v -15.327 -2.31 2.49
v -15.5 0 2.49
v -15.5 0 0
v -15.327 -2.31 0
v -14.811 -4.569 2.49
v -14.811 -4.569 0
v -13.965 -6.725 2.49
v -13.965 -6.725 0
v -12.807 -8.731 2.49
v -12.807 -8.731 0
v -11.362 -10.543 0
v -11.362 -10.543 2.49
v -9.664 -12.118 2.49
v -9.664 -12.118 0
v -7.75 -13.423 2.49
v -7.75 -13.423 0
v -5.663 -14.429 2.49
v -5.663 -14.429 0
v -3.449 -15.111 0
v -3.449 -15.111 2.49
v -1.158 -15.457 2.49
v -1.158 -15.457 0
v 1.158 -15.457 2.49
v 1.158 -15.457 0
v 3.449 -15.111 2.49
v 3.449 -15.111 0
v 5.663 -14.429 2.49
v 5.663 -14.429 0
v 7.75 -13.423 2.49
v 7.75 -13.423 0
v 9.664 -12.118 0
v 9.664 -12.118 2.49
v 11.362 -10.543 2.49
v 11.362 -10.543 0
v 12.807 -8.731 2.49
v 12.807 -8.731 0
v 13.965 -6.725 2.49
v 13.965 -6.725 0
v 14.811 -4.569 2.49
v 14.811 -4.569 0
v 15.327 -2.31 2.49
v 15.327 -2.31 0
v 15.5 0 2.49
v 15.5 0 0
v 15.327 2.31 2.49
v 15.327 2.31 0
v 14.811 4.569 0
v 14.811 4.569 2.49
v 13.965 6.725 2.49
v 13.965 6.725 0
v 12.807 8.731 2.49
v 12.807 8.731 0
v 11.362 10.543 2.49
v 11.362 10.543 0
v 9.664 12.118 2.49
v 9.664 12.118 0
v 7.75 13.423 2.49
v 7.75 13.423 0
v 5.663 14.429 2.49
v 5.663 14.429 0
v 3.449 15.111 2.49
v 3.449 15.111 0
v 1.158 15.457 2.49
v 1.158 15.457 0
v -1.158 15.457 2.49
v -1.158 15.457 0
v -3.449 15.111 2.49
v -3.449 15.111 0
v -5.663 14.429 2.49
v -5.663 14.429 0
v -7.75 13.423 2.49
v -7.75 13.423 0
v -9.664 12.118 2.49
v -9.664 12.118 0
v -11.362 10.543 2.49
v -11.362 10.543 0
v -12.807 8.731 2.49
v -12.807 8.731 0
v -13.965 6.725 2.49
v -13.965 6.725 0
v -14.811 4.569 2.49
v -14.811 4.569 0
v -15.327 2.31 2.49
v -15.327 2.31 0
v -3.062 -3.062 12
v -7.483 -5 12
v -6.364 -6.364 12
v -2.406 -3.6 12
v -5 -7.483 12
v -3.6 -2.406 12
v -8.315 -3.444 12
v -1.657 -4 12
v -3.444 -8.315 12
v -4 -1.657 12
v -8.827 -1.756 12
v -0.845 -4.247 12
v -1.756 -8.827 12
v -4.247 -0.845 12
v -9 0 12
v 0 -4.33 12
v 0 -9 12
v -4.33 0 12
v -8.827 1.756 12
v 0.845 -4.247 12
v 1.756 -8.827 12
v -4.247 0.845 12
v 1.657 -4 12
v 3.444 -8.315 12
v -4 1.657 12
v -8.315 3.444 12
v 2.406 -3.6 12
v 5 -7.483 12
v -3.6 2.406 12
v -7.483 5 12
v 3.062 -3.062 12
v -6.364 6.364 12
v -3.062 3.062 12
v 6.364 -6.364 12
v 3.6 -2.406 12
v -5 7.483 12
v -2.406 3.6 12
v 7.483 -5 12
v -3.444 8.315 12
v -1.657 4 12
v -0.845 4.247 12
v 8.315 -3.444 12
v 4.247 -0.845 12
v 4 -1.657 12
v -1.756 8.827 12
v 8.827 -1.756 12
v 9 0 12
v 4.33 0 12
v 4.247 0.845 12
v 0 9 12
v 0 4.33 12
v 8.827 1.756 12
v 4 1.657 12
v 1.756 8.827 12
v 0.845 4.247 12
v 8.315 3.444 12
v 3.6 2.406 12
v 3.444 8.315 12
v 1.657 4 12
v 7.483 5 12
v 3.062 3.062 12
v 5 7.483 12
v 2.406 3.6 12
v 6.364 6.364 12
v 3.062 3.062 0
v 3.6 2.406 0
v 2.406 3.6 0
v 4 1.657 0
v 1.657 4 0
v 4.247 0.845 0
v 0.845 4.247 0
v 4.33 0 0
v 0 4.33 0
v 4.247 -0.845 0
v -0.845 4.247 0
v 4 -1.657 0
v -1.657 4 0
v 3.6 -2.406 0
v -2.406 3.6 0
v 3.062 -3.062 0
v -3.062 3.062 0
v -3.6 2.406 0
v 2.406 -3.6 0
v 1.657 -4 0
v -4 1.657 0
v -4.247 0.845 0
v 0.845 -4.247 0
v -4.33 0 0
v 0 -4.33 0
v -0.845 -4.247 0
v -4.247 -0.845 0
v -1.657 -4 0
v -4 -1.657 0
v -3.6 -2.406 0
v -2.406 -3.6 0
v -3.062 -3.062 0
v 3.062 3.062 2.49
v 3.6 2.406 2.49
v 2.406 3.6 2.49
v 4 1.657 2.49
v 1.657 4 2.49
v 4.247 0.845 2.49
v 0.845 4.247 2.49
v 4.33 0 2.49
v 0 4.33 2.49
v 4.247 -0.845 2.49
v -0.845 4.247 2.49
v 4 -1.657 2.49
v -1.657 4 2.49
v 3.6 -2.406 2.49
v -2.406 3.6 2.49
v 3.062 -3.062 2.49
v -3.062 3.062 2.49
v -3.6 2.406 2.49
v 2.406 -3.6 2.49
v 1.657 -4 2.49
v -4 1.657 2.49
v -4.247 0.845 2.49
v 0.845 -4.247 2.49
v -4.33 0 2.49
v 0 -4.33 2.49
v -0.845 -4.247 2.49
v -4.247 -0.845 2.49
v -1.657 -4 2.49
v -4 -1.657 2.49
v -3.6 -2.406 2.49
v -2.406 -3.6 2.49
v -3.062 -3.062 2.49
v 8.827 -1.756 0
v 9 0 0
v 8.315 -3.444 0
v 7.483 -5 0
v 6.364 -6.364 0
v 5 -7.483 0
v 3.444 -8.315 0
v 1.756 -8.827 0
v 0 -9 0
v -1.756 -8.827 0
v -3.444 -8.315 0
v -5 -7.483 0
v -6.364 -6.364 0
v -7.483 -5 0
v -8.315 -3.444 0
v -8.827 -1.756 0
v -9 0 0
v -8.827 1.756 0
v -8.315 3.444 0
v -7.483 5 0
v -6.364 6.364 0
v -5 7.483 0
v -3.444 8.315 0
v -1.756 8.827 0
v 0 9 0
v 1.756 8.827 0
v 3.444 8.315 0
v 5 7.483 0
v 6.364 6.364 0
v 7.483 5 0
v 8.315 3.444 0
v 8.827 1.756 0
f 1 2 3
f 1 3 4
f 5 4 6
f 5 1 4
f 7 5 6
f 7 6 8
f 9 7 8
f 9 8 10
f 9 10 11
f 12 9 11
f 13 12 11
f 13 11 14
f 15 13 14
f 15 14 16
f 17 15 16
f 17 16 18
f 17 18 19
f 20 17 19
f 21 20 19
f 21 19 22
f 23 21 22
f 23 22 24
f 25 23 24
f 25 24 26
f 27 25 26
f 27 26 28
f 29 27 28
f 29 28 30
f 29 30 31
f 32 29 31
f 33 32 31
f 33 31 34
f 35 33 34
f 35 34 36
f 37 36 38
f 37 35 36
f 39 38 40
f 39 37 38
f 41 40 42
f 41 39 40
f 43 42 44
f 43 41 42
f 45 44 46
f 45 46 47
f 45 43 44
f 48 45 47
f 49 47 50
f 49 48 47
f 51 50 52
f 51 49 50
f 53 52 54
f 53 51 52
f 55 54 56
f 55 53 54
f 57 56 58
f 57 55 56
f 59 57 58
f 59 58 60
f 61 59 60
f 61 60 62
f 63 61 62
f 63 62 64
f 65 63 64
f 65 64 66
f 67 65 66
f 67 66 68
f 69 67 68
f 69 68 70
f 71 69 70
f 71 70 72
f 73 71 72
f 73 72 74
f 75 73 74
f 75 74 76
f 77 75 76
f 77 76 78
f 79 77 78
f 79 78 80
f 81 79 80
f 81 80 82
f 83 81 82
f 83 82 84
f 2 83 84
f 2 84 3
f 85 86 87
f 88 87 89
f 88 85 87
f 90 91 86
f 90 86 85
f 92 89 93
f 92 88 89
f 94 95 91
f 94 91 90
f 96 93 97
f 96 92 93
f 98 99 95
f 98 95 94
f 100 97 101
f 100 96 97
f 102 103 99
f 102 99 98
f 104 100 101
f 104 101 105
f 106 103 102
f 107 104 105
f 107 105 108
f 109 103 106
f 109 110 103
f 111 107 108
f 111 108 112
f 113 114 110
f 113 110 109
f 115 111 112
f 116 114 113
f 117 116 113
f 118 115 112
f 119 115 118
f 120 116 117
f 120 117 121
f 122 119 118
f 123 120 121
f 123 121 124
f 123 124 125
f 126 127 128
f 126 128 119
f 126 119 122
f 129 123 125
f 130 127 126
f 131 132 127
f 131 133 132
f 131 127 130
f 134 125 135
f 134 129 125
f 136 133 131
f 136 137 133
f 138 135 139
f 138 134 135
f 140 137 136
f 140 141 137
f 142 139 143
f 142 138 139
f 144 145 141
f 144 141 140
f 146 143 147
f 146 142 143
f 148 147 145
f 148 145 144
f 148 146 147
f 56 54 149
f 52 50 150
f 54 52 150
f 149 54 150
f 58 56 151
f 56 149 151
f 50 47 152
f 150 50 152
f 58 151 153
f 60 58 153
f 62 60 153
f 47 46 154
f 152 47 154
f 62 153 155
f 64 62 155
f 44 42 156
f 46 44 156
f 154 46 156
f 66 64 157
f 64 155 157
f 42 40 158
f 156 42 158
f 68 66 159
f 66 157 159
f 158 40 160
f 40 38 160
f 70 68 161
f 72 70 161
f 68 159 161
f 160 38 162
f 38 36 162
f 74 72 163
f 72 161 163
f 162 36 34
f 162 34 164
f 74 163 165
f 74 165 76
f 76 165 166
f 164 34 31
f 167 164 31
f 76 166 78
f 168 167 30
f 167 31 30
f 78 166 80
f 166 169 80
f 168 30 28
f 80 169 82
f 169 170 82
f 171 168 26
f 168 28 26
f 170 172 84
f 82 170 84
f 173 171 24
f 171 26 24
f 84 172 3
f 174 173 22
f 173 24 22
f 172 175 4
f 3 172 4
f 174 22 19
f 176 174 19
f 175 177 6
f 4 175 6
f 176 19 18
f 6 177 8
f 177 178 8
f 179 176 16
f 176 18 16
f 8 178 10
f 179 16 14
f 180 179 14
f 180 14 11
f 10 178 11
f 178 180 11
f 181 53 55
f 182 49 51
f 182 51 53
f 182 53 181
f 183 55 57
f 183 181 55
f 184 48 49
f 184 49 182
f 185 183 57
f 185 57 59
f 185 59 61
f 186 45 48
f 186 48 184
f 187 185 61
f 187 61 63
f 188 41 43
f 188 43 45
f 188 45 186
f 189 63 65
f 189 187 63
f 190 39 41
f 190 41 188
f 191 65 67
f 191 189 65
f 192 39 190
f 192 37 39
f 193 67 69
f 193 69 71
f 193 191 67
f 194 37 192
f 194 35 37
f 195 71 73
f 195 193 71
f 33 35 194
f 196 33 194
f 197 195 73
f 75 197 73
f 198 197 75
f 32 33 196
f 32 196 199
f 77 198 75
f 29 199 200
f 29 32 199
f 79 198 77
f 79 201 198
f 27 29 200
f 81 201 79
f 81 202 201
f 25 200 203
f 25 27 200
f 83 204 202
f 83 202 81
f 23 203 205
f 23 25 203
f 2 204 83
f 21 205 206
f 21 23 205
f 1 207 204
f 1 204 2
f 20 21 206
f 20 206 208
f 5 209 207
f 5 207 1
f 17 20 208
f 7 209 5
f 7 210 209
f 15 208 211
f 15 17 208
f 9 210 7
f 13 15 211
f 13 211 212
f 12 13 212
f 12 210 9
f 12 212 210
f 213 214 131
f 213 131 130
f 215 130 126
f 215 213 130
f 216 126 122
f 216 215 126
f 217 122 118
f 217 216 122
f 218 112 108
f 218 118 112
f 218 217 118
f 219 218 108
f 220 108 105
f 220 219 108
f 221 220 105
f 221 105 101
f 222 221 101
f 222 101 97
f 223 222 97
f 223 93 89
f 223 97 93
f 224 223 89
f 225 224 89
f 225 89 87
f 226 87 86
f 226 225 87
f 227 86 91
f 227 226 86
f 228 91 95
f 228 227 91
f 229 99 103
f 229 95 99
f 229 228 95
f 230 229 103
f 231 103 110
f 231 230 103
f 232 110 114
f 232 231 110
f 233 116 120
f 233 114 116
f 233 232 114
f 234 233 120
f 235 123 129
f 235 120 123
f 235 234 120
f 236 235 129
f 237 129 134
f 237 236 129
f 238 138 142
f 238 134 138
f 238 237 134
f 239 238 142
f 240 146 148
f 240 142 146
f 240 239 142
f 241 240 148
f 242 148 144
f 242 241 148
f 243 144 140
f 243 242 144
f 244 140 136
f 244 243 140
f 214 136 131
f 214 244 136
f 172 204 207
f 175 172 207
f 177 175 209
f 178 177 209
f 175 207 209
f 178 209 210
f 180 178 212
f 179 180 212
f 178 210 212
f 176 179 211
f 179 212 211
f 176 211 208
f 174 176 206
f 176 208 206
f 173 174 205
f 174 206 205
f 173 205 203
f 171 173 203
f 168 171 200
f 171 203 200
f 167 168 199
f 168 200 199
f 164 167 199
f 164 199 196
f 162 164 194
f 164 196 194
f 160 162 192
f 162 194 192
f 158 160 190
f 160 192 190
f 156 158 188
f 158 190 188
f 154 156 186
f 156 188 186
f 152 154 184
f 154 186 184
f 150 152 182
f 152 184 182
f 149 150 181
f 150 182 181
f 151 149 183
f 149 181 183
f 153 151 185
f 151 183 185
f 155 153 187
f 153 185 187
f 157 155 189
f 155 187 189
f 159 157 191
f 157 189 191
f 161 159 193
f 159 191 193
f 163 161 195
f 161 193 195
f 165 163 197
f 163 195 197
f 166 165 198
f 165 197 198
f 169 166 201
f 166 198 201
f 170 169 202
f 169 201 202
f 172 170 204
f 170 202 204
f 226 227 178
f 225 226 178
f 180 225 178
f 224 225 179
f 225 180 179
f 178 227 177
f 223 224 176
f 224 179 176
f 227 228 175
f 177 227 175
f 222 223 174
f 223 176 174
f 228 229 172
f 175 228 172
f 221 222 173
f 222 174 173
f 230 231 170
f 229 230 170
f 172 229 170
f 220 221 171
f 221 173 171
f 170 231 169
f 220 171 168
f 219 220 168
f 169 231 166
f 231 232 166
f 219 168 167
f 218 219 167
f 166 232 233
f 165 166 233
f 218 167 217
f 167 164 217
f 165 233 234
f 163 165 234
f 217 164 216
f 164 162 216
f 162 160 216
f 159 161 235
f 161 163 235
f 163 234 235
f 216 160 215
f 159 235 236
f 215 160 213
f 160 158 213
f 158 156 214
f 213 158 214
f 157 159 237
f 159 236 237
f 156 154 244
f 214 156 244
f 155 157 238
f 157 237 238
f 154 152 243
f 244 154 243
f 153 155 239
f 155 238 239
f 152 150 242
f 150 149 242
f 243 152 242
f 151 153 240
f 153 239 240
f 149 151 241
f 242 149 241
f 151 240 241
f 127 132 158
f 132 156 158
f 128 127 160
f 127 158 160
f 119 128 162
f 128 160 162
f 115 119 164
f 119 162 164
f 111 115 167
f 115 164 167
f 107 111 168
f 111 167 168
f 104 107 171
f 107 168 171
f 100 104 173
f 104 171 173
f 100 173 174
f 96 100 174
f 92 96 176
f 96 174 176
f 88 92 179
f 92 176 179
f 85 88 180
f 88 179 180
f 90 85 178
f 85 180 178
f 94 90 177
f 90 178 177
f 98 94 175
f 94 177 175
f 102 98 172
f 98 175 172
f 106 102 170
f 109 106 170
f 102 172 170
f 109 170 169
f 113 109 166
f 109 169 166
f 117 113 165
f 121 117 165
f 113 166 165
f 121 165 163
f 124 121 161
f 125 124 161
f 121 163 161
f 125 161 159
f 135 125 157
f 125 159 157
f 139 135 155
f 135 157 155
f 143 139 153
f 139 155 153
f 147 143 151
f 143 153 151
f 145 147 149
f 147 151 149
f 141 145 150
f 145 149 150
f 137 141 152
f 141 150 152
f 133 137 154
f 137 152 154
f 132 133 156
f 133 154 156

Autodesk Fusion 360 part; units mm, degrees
sketch "Sketch1" plane through (0, 0, 0) normal (0, 0, 1) x (1, 0, 0)
  circle A0 centre (0, 0) radius 11.99
  dimension "d1" = 23.98
sketch "Sketch2" plane through (0, 0, 0) normal (0, 0, 1) x (1, 0, 0)
  circle A0 centre (0, 0) radius 9
  dimension "d2" = 18
sketch "Sketch3" plane through (0, 0, 0) normal (0, 1, 0) x (1, 0, 0)
sketch "Sketch4" plane through (0, 0, 0) normal (0, 0, 1) x (1, 0, 0)
  circle A0 centre (0, 0) radius 4.33
  dimension "d3" = 8.66
extrude "Extrude1" add sketch "Sketch1" along normal blind 2.49 makes body 1
extrude "Extrude2" add sketch "Sketch2" along normal blind 12 separate body makes body 2
extrude "Extrude3" cut sketch "Sketch4" along normal blind 25 bodies 1 2
sketch "Sketch5" plane through (0, 0, 2.49) normal (0, 0, 1) x (-1, 0, 0)
  circle A0 centre (0, 0) radius 4.33
  circle A1 centre (0, 0) radius 11.99
sketch "Sketch6" plane through (0, 0, 2.49) normal (0, 0, 1) x (-1, 0, 0)
  circle A0 centre (0, 0) radius 15.5
  dimension "d10" = 31
extrude "Extrude4" add sketch "Sketch6" against normal blind 2.49 separate body makes body 3
extrude "Extrude5" add sketch "Sketch4" along normal blind 30 separate body makes body 4
sketch "Boceto7" plane through (0, 0, 12) normal (0, 0, 1) x (-1, 0, 0)
  circle A0 centre (0, 0) radius 4.33
  circle A1 centre (0, 0) radius 9
  circle A2 centre (0, 0) radius 4.33
  dimension "d15" = 8.66
extrude "Extruir6" cut sketch "Boceto7" against normal blind 13 contours A0 A2 bodies 3
hidden bodies 1 4
